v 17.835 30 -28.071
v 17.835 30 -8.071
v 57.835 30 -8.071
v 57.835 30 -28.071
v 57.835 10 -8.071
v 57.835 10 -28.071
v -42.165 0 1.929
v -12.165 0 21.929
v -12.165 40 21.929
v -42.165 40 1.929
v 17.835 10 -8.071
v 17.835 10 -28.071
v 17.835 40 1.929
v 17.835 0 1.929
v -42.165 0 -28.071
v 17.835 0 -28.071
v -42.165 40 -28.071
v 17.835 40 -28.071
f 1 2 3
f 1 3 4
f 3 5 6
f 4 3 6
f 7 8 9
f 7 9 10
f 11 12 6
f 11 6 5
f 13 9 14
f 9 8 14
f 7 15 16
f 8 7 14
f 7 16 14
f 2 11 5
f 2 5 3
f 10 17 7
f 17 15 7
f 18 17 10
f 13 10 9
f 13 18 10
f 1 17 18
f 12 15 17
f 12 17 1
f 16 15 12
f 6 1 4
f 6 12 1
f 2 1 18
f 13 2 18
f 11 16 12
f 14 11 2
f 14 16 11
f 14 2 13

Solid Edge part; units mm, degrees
sketch "Sketch1" plane through (0, 0, 0) normal (0, -1, 0) x (1, 0, 0)
  line L0 (-12.1652, 21.9294) -> (17.8348, 1.9294)
  line L1 (17.8348, -28.0706) -> (17.8348, 1.9294)
  line L2 (-42.1652, -28.0706) -> (17.8348, -28.0706)
  line L3 (-42.1652, -28.0706) -> (-42.1652, 1.9294)
  line L4 (-12.1652, 21.9294) -> (-42.1652, 1.9294)
extrude "Protrusion1" add sketch "Sketch1" against normal blind 40
sketch "Sketch2" plane through (17.8348, 20, -13.0706) normal (1, 0, 0) x (0, 1, 0)
  line L0 (-10, -15) -> (-10, 5)
  line L1 (-10, 5) -> (10, 5)
  line L2 (10, 5) -> (10, -15)
  line L3 (10, -15) -> (-10, -15)
extrude "ExtrudedProtrusion_2" add sketch "Sketch2" along normal blind 40
